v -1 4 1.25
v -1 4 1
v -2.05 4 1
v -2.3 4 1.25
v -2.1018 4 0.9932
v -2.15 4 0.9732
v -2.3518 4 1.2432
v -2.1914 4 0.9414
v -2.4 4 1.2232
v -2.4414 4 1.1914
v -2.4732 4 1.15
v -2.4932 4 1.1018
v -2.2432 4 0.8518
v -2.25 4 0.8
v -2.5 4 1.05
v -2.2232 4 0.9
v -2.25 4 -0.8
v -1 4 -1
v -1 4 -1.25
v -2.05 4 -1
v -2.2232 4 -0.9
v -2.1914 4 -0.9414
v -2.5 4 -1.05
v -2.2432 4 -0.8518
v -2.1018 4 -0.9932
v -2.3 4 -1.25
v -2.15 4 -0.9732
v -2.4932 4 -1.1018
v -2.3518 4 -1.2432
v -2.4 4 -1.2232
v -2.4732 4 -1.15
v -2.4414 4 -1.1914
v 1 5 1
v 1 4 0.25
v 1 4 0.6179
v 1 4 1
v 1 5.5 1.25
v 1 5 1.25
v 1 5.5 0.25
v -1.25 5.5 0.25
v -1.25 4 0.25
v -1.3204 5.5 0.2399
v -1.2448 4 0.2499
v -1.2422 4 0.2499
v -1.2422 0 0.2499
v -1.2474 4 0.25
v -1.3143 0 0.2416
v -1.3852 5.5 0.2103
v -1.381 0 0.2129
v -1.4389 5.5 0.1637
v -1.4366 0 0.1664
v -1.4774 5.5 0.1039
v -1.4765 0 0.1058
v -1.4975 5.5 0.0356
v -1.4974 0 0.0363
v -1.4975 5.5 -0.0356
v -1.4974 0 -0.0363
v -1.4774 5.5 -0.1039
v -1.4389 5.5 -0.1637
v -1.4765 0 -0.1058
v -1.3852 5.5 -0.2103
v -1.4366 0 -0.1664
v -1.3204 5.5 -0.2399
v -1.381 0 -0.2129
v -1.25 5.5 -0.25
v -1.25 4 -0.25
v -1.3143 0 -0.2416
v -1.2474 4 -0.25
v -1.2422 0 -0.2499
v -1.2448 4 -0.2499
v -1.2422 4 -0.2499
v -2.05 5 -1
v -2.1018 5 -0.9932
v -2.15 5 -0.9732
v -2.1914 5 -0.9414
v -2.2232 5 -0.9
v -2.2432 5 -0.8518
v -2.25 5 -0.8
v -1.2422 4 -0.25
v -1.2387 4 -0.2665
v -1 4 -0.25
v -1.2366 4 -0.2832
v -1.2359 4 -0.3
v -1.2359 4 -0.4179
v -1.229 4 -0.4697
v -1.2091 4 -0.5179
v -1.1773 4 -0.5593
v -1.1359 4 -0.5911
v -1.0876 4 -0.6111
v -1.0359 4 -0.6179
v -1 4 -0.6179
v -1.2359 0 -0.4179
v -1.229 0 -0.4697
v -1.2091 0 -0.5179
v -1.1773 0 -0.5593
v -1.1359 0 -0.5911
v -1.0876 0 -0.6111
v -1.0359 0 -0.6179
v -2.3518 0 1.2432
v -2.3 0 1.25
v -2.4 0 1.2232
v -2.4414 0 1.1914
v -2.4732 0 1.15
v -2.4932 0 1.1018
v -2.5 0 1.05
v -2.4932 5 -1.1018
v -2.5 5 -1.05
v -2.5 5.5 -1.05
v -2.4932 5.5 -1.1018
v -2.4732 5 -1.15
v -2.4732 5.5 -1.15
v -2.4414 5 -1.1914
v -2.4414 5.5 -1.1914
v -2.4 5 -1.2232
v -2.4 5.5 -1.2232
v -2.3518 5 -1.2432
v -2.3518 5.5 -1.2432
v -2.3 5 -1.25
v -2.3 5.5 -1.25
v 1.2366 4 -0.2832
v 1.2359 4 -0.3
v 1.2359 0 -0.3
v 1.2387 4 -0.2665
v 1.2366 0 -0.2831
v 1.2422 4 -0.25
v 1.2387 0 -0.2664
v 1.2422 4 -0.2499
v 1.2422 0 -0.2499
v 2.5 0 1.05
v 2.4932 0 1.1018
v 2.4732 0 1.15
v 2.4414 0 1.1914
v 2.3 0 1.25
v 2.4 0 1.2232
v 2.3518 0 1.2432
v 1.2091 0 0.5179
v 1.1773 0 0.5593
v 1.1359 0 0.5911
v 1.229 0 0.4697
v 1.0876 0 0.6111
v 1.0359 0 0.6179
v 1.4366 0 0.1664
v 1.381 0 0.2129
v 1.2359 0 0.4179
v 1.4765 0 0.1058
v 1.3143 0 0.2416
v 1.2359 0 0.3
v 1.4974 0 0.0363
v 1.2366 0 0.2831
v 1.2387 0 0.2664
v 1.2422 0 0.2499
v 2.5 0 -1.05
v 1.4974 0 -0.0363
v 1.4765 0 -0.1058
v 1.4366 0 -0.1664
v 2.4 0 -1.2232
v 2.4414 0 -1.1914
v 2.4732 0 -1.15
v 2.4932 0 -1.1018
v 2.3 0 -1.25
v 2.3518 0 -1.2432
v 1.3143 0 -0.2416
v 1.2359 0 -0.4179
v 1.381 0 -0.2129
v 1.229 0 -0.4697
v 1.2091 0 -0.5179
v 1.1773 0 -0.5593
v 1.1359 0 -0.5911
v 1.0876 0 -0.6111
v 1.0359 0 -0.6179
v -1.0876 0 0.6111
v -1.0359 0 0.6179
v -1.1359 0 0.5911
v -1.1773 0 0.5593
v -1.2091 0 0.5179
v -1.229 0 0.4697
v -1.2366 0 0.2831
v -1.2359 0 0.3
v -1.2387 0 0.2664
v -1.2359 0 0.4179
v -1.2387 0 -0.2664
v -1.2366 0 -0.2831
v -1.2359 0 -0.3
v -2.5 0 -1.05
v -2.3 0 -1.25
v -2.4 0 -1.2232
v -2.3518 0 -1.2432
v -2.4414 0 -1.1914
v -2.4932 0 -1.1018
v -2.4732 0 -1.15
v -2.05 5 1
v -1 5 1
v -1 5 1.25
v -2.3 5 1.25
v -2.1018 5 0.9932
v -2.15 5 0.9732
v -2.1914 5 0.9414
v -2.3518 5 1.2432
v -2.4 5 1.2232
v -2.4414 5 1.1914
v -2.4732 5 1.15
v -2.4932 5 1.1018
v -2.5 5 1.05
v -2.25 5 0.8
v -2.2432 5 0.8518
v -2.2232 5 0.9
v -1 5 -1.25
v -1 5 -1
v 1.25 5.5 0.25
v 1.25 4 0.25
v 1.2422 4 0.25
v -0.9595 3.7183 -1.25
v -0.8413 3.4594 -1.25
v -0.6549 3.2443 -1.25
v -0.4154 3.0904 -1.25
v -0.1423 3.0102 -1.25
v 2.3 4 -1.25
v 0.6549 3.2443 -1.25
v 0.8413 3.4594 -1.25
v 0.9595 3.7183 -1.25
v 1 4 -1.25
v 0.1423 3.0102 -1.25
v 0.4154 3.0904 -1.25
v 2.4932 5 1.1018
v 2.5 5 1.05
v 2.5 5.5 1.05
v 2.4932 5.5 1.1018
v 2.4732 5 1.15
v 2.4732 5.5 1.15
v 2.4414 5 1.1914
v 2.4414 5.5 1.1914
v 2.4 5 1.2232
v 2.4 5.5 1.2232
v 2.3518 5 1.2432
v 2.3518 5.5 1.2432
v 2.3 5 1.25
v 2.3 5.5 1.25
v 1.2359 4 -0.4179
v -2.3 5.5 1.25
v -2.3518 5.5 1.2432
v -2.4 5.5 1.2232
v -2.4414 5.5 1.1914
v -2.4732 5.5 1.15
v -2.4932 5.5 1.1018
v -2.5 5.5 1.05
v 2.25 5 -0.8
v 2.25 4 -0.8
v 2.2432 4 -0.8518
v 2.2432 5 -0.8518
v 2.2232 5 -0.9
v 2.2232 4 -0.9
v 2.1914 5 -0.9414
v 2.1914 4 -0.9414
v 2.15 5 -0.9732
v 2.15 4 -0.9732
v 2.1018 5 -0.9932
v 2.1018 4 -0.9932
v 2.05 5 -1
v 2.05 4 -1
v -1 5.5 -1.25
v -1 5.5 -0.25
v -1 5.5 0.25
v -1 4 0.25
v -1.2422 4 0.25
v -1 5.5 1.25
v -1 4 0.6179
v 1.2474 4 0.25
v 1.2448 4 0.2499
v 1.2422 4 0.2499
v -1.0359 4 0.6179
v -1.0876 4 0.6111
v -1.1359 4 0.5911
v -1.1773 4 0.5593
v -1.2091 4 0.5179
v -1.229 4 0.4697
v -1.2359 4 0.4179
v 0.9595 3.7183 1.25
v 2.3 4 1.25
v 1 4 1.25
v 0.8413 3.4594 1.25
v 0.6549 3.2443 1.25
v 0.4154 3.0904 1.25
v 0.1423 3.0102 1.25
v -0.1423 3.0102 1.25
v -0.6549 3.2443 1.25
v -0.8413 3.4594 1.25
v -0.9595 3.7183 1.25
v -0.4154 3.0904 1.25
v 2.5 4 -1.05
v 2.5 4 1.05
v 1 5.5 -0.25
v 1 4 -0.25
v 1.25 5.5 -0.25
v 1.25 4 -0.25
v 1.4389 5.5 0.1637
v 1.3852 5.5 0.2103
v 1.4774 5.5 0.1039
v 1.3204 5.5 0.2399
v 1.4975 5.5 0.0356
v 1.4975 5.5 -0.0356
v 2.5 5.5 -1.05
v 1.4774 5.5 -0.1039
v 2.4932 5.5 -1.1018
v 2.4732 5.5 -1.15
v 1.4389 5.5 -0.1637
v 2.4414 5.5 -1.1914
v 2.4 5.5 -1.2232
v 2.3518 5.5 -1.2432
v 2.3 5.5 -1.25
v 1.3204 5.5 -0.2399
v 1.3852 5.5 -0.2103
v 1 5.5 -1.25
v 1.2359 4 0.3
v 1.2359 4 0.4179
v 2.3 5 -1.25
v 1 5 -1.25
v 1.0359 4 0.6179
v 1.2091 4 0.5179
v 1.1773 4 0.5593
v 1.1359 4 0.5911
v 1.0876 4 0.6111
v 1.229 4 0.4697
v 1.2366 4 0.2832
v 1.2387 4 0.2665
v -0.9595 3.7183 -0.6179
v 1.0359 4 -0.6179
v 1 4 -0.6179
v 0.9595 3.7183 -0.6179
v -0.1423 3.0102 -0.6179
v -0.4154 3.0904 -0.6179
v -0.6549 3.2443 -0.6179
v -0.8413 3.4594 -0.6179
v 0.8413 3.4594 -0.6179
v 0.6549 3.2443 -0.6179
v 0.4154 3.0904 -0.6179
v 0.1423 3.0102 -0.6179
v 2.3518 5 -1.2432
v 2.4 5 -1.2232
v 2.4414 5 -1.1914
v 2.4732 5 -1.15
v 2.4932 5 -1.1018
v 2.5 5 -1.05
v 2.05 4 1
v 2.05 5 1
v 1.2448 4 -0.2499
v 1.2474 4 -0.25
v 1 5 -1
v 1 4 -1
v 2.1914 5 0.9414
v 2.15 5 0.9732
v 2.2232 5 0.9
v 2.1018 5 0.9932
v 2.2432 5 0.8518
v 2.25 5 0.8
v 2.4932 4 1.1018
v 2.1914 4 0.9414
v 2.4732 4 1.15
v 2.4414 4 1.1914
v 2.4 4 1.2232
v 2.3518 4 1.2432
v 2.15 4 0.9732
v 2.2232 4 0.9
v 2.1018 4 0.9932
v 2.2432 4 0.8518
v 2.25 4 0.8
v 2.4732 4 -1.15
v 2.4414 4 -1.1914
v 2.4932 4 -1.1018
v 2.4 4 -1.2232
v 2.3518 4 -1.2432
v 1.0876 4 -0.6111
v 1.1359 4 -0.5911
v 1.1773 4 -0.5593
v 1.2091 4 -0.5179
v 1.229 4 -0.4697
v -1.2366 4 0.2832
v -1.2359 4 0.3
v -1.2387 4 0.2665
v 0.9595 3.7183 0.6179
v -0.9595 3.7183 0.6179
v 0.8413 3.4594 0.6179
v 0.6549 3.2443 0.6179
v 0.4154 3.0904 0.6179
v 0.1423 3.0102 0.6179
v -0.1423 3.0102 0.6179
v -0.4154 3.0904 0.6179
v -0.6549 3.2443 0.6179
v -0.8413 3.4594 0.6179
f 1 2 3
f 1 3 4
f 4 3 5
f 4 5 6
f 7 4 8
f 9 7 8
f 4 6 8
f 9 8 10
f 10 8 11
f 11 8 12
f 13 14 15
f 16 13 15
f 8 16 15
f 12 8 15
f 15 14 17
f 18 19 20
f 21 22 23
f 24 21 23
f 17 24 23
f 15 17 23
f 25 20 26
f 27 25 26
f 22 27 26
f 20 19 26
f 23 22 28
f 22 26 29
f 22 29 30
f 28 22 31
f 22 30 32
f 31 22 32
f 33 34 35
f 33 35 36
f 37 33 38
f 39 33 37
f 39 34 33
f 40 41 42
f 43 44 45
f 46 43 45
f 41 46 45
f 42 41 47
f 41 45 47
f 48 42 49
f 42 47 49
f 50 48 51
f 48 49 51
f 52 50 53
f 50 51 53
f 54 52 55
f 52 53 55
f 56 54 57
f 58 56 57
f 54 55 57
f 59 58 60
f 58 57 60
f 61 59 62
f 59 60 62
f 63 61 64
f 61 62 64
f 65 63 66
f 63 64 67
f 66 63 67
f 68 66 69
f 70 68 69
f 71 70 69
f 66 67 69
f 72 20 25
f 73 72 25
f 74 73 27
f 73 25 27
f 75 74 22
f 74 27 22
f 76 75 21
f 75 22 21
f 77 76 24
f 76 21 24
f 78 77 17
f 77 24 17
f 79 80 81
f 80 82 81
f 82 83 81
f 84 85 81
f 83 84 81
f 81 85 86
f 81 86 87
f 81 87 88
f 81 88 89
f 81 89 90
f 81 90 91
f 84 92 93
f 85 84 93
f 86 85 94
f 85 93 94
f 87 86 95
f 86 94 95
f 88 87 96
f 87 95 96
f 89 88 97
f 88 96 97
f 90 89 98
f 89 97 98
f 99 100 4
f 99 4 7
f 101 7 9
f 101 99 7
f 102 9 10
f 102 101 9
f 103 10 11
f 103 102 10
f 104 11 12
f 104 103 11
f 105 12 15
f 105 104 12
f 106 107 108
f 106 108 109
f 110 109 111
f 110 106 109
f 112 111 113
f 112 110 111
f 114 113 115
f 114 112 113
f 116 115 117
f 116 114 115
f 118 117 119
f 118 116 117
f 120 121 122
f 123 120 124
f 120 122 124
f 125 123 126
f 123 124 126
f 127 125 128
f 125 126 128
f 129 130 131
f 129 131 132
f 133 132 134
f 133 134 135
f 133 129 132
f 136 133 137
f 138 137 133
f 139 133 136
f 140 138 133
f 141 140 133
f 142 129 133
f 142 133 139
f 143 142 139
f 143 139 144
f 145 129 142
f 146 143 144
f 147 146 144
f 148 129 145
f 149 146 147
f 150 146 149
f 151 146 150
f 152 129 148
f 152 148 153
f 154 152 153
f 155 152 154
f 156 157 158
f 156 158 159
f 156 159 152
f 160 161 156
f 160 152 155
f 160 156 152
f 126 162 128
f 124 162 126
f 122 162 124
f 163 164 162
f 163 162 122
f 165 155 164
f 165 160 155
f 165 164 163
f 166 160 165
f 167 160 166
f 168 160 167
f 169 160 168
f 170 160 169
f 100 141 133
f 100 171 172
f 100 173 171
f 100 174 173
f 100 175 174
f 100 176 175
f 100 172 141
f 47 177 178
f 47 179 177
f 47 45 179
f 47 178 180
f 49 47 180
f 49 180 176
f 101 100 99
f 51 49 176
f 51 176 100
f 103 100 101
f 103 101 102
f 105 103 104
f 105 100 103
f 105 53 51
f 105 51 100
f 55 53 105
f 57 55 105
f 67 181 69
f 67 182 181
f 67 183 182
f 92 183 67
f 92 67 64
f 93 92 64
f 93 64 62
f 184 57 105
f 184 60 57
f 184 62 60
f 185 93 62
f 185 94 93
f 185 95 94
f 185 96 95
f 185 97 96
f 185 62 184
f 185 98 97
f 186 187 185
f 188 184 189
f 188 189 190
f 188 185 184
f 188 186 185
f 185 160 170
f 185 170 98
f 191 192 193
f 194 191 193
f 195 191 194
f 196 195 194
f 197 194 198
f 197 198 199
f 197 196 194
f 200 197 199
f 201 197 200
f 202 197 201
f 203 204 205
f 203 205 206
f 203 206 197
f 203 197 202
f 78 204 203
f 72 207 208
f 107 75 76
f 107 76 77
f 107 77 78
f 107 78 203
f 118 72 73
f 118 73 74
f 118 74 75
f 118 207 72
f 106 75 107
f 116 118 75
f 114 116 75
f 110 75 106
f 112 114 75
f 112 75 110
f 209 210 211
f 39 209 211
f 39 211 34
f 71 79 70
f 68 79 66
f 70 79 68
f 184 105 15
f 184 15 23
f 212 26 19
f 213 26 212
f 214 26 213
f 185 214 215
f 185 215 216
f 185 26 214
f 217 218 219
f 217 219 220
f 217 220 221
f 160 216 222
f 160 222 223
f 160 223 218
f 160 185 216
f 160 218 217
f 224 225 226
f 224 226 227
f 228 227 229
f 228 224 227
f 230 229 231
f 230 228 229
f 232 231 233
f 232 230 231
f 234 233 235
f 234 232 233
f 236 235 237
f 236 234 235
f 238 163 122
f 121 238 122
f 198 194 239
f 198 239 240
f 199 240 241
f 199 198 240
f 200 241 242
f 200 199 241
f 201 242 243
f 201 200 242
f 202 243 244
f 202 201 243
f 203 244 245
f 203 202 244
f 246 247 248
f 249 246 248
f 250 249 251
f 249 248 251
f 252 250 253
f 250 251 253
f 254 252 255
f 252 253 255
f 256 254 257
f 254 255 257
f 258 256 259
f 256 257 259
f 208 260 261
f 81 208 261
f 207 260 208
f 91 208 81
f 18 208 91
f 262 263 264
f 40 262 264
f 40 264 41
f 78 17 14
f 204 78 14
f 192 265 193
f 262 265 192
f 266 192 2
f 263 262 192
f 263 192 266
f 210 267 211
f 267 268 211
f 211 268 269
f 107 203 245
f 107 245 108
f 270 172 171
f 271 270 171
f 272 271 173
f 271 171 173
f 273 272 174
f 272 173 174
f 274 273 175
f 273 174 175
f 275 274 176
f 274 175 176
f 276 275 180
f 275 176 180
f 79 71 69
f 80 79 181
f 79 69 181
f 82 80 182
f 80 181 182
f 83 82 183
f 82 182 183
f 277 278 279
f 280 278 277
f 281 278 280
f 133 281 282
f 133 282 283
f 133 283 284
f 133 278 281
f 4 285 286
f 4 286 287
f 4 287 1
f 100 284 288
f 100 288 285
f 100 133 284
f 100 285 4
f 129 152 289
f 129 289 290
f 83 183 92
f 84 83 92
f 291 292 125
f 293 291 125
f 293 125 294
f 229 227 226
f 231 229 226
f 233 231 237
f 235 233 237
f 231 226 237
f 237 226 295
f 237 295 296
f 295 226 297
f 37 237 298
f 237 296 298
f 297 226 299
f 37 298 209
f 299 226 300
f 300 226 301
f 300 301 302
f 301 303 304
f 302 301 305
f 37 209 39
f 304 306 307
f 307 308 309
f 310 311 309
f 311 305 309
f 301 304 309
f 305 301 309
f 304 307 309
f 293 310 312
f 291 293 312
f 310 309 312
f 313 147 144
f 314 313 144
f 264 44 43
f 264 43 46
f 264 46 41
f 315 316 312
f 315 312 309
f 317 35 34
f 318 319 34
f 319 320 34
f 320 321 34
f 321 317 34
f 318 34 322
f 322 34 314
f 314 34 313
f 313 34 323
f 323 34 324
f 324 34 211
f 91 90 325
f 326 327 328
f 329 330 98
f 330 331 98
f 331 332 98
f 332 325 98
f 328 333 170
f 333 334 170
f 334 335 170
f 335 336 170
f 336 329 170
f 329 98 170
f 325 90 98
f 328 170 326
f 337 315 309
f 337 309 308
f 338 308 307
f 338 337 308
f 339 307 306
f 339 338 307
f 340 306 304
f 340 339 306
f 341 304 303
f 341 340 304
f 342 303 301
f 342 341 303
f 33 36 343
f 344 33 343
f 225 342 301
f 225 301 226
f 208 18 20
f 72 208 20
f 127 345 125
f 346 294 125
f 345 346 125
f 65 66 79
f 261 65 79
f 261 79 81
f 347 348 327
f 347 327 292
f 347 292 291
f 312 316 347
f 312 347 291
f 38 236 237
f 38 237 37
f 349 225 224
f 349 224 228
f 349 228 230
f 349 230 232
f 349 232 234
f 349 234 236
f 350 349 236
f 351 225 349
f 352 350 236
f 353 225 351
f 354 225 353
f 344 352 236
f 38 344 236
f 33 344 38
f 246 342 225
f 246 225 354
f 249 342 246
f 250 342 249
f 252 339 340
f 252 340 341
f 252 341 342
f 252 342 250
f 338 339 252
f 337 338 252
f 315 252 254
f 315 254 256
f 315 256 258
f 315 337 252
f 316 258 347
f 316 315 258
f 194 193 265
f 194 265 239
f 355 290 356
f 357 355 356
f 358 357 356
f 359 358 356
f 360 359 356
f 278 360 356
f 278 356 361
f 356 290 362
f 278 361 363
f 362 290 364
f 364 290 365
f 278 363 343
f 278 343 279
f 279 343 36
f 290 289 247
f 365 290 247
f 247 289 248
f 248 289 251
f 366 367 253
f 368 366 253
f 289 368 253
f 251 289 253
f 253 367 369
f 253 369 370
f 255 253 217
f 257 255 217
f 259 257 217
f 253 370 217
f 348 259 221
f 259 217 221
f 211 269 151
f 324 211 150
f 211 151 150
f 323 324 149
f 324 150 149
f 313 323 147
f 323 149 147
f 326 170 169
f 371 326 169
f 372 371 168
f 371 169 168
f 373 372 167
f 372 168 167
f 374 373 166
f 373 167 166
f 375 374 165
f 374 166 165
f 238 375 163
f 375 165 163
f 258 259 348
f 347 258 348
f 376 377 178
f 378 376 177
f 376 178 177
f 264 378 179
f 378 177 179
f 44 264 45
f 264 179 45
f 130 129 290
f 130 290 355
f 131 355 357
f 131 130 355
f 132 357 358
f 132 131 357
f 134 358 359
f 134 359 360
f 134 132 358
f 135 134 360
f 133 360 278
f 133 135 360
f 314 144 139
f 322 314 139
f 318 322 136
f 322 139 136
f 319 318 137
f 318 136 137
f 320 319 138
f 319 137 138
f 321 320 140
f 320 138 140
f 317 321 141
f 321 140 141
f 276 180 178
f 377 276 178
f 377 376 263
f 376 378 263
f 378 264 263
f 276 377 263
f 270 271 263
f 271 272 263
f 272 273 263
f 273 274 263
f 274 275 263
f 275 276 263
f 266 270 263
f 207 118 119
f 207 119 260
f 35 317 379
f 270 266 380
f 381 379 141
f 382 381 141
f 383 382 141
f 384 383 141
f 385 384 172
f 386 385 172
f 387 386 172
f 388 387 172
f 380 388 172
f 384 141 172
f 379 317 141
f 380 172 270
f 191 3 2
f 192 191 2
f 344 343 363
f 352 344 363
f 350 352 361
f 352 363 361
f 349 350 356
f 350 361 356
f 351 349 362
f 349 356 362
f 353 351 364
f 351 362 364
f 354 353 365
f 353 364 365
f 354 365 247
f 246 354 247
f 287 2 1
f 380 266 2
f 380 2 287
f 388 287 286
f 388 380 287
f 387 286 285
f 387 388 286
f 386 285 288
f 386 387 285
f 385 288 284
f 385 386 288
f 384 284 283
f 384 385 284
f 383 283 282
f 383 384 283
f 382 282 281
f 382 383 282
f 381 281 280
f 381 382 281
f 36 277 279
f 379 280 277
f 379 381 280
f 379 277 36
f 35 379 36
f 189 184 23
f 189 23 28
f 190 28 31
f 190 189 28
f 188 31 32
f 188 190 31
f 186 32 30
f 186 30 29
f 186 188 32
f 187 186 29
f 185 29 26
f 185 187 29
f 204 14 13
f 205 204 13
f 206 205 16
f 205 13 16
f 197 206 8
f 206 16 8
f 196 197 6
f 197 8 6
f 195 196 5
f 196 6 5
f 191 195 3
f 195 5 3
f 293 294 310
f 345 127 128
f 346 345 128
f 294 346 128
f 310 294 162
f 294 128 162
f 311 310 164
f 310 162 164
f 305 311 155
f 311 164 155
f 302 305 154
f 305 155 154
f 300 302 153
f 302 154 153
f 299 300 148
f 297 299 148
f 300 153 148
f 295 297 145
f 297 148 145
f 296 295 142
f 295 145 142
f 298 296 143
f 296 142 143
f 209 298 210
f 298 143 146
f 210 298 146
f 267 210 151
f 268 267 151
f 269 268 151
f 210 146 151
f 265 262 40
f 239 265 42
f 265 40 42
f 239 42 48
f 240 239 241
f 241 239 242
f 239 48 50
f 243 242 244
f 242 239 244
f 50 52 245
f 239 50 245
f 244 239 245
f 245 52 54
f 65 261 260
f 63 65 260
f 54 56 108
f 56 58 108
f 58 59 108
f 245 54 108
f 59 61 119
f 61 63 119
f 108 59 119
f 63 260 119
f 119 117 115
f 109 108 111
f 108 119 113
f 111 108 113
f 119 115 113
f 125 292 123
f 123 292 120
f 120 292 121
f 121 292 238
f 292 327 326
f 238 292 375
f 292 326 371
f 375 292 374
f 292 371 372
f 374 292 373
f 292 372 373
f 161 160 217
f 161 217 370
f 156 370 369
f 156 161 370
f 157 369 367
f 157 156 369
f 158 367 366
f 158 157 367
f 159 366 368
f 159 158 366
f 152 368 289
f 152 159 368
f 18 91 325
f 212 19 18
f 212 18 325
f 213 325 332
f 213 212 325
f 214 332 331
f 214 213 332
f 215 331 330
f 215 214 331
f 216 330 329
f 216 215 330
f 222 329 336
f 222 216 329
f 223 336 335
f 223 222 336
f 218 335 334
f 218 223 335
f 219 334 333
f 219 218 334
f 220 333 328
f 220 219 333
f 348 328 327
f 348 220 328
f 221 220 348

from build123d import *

# Parameters (mm, degrees)
Y_KSEKLIK_EKSTR_ZYON1_DEPTH = 4
Y_KSEKLIK_EKSTR_ZYON2_DEPTH = 1
Y_KSEKLIK_EKSTR_ZYON3_DEPTH = 0.5
KES_EKSTR_ZYON1_DEPTH       = 3.5


with BuildPart() as part:
    # Çizim1 → Yükseklik-Ekstrüzyon1 (new body)
    with BuildSketch(Plane(origin=(0, 0, 0), x_dir=(1, 0, 0), z_dir=(0, 1, 0))):
        with BuildLine():
            Line((-2.3, 1.25), (2.3, 1.25))
            ThreePointArc((2.3, 1.25), (2.441421356, 1.191421356), (2.5, 1.05))
            Line((2.5, 1.05), (2.5, -1.05))
            ThreePointArc((2.5, -1.05), (2.441421356, -1.191421356), (2.3, -1.25))
            Line((2.3, -1.25), (-2.3, -1.25))
            ThreePointArc((-2.3, -1.25), (-2.441421356, -1.191421356), (-2.5, -1.05))
            Line((-2.5, -1.05), (-2.5, 1.05))
            ThreePointArc((-2.5, 1.05), (-2.441421356, 1.191421356), (-2.3, 1.25))
        make_face()
        with BuildLine():
            Line((1.235851797, -0.3), (1.235851797, -0.417925898))
            ThreePointArc((1.235851797, -0.417925898), (1.177273153, -0.559347255), (1.035851797, -0.617925898))
            Line((1.035851797, -0.617925898), (-1.035851797, -0.617925898))
            ThreePointArc((-1.035851797, -0.617925898), (-1.177273153, -0.559347255), (-1.235851797, -0.417925898))
            Line((-1.235851797, -0.417925898), (-1.235851797, -0.3))
            ThreePointArc((-1.235851797, -0.3), (-1.237453719, -0.274737328), (-1.242233823, -0.249879344))
            ThreePointArc((-1.242233823, -0.249879344), (-1.5, 0), (-1.242233823, 0.249879344))
            ThreePointArc((-1.242233823, 0.249879344), (-1.237453719, 0.274737328), (-1.235851797, 0.3))
            Line((-1.235851797, 0.3), (-1.235851797, 0.417925898))
            ThreePointArc((-1.235851797, 0.417925898), (-1.177273153, 0.559347255), (-1.035851797, 0.617925898))
            Line((-1.035851797, 0.617925898), (1.035851797, 0.617925898))
            ThreePointArc((1.035851797, 0.617925898), (1.177273153, 0.559347255), (1.235851797, 0.417925898))
            Line((1.235851797, 0.417925898), (1.235851797, 0.3))
            ThreePointArc((1.235851797, 0.3), (1.237453719, 0.274737328), (1.242233823, 0.249879344))
            ThreePointArc((1.242233823, 0.249879344), (1.5, 0), (1.242233823, -0.249879344))
            ThreePointArc((1.242233823, -0.249879344), (1.237453719, -0.274737328), (1.235851797, -0.3))
        make_face(mode=Mode.SUBTRACT)
    extrude(amount=Y_KSEKLIK_EKSTR_ZYON1_DEPTH)

    # Çizim3 → Yükseklik-Ekstrüzyon2 (add)
    with BuildSketch(Plane(origin=(0, 4, 0), x_dir=(1, 0, 0), z_dir=(0, 1, 0))):
        with BuildLine():
            Line((-2.05, -1), (2.05, -1))
            ThreePointArc((2.05, -1), (2.191421356, -0.941421356), (2.25, -0.8))
            Line((2.25, -0.8), (2.25, 0.8))
            ThreePointArc((2.25, 0.8), (2.191421356, 0.941421356), (2.05, 1))
            Line((2.05, 1), (-2.05, 1))
            ThreePointArc((-2.05, 1), (-2.191421356, 0.941421356), (-2.25, 0.8))
            Line((-2.25, 0.8), (-2.25, -0.8))
            ThreePointArc((-2.25, -0.8), (-2.191421356, -0.941421356), (-2.05, -1))
        make_face()
        with BuildLine():
            Line((-1.25, 0.25), (1.25, 0.25))
            ThreePointArc((1.25, 0.25), (1.5, 0), (1.25, -0.25))
            Line((1.25, -0.25), (-1.25, -0.25))
            ThreePointArc((-1.25, -0.25), (-1.5, 0), (-1.25, 0.25))
        make_face(mode=Mode.SUBTRACT)
    extrude(amount=Y_KSEKLIK_EKSTR_ZYON2_DEPTH)

    # Çizim4 → Yükseklik-Ekstrüzyon3 (add)
    with BuildSketch(Plane(origin=(0, 5, 0), x_dir=(1, 0, 0), z_dir=(0, 1, 0))):
        with BuildLine():
            Line((-2.3, 1.25), (2.3, 1.25))
            ThreePointArc((2.3, 1.25), (2.441421356, 1.191421356), (2.5, 1.05))
            Line((2.5, 1.05), (2.5, -1.05))
            ThreePointArc((2.5, -1.05), (2.441421356, -1.191421356), (2.3, -1.25))
            Line((2.3, -1.25), (-2.3, -1.25))
            ThreePointArc((-2.3, -1.25), (-2.441421356, -1.191421356), (-2.5, -1.05))
            Line((-2.5, -1.05), (-2.5, 1.05))
            ThreePointArc((-2.5, 1.05), (-2.441421356, 1.191421356), (-2.3, 1.25))
        make_face()
        with BuildLine():
            ThreePointArc((2.25, 0.8), (2.191421356, 0.941421356), (2.05, 1))
            Line((2.05, 1), (-2.05, 1))
            ThreePointArc((-2.05, 1), (-2.191421356, 0.941421356), (-2.25, 0.8))
            Line((-2.25, 0.8), (-2.25, -0.8))
            ThreePointArc((-2.25, -0.8), (-2.191421356, -0.941421356), (-2.05, -1))
            Line((-2.05, -1), (2.05, -1))
            ThreePointArc((2.05, -1), (2.191421356, -0.941421356), (2.25, -0.8))
            Line((2.25, -0.8), (2.25, 0.8))
        make_face(mode=Mode.SUBTRACT)
        with BuildLine():
            Line((2.25, -0.8), (2.25, 0.8))
            ThreePointArc((2.25, 0.8), (2.191421356, 0.941421356), (2.05, 1))
            Line((2.05, 1), (-2.05, 1))
            ThreePointArc((-2.05, 1), (-2.191421356, 0.941421356), (-2.25, 0.8))
            Line((-2.25, 0.8), (-2.25, -0.8))
            ThreePointArc((-2.25, -0.8), (-2.191421356, -0.941421356), (-2.05, -1))
            Line((-2.05, -1), (2.05, -1))
            ThreePointArc((2.05, -1), (2.191421356, -0.941421356), (2.25, -0.8))
        make_face()
        with BuildLine():
            Line((1.25, -0.25), (-1.25, -0.25))
            ThreePointArc((-1.25, -0.25), (-1.5, 0), (-1.25, 0.25))
            Line((-1.25, 0.25), (1.25, 0.25))
            ThreePointArc((1.25, 0.25), (1.5, 0), (1.25, -0.25))
        make_face(mode=Mode.SUBTRACT)
    extrude(amount=Y_KSEKLIK_EKSTR_ZYON3_DEPTH)

    # Çizim5 → Kes-Ekstrüzyon1 (cut, through all)
    with BuildSketch(Plane(origin=(0, 0, -1.25), x_dir=(-1, 0, 0), z_dir=(0, 0, -1))):
        with BuildLine():
            Line((-1, 4), (-1, 5.5))
            Line((-1, 5.5), (1, 5.5))
            Line((1, 5.5), (1, 4))
            ThreePointArc((1, 4), (0, 3), (-1, 4))
        make_face()
    extrude(amount=-KES_EKSTR_ZYON1_DEPTH, mode=Mode.SUBTRACT)


solid = part.part
